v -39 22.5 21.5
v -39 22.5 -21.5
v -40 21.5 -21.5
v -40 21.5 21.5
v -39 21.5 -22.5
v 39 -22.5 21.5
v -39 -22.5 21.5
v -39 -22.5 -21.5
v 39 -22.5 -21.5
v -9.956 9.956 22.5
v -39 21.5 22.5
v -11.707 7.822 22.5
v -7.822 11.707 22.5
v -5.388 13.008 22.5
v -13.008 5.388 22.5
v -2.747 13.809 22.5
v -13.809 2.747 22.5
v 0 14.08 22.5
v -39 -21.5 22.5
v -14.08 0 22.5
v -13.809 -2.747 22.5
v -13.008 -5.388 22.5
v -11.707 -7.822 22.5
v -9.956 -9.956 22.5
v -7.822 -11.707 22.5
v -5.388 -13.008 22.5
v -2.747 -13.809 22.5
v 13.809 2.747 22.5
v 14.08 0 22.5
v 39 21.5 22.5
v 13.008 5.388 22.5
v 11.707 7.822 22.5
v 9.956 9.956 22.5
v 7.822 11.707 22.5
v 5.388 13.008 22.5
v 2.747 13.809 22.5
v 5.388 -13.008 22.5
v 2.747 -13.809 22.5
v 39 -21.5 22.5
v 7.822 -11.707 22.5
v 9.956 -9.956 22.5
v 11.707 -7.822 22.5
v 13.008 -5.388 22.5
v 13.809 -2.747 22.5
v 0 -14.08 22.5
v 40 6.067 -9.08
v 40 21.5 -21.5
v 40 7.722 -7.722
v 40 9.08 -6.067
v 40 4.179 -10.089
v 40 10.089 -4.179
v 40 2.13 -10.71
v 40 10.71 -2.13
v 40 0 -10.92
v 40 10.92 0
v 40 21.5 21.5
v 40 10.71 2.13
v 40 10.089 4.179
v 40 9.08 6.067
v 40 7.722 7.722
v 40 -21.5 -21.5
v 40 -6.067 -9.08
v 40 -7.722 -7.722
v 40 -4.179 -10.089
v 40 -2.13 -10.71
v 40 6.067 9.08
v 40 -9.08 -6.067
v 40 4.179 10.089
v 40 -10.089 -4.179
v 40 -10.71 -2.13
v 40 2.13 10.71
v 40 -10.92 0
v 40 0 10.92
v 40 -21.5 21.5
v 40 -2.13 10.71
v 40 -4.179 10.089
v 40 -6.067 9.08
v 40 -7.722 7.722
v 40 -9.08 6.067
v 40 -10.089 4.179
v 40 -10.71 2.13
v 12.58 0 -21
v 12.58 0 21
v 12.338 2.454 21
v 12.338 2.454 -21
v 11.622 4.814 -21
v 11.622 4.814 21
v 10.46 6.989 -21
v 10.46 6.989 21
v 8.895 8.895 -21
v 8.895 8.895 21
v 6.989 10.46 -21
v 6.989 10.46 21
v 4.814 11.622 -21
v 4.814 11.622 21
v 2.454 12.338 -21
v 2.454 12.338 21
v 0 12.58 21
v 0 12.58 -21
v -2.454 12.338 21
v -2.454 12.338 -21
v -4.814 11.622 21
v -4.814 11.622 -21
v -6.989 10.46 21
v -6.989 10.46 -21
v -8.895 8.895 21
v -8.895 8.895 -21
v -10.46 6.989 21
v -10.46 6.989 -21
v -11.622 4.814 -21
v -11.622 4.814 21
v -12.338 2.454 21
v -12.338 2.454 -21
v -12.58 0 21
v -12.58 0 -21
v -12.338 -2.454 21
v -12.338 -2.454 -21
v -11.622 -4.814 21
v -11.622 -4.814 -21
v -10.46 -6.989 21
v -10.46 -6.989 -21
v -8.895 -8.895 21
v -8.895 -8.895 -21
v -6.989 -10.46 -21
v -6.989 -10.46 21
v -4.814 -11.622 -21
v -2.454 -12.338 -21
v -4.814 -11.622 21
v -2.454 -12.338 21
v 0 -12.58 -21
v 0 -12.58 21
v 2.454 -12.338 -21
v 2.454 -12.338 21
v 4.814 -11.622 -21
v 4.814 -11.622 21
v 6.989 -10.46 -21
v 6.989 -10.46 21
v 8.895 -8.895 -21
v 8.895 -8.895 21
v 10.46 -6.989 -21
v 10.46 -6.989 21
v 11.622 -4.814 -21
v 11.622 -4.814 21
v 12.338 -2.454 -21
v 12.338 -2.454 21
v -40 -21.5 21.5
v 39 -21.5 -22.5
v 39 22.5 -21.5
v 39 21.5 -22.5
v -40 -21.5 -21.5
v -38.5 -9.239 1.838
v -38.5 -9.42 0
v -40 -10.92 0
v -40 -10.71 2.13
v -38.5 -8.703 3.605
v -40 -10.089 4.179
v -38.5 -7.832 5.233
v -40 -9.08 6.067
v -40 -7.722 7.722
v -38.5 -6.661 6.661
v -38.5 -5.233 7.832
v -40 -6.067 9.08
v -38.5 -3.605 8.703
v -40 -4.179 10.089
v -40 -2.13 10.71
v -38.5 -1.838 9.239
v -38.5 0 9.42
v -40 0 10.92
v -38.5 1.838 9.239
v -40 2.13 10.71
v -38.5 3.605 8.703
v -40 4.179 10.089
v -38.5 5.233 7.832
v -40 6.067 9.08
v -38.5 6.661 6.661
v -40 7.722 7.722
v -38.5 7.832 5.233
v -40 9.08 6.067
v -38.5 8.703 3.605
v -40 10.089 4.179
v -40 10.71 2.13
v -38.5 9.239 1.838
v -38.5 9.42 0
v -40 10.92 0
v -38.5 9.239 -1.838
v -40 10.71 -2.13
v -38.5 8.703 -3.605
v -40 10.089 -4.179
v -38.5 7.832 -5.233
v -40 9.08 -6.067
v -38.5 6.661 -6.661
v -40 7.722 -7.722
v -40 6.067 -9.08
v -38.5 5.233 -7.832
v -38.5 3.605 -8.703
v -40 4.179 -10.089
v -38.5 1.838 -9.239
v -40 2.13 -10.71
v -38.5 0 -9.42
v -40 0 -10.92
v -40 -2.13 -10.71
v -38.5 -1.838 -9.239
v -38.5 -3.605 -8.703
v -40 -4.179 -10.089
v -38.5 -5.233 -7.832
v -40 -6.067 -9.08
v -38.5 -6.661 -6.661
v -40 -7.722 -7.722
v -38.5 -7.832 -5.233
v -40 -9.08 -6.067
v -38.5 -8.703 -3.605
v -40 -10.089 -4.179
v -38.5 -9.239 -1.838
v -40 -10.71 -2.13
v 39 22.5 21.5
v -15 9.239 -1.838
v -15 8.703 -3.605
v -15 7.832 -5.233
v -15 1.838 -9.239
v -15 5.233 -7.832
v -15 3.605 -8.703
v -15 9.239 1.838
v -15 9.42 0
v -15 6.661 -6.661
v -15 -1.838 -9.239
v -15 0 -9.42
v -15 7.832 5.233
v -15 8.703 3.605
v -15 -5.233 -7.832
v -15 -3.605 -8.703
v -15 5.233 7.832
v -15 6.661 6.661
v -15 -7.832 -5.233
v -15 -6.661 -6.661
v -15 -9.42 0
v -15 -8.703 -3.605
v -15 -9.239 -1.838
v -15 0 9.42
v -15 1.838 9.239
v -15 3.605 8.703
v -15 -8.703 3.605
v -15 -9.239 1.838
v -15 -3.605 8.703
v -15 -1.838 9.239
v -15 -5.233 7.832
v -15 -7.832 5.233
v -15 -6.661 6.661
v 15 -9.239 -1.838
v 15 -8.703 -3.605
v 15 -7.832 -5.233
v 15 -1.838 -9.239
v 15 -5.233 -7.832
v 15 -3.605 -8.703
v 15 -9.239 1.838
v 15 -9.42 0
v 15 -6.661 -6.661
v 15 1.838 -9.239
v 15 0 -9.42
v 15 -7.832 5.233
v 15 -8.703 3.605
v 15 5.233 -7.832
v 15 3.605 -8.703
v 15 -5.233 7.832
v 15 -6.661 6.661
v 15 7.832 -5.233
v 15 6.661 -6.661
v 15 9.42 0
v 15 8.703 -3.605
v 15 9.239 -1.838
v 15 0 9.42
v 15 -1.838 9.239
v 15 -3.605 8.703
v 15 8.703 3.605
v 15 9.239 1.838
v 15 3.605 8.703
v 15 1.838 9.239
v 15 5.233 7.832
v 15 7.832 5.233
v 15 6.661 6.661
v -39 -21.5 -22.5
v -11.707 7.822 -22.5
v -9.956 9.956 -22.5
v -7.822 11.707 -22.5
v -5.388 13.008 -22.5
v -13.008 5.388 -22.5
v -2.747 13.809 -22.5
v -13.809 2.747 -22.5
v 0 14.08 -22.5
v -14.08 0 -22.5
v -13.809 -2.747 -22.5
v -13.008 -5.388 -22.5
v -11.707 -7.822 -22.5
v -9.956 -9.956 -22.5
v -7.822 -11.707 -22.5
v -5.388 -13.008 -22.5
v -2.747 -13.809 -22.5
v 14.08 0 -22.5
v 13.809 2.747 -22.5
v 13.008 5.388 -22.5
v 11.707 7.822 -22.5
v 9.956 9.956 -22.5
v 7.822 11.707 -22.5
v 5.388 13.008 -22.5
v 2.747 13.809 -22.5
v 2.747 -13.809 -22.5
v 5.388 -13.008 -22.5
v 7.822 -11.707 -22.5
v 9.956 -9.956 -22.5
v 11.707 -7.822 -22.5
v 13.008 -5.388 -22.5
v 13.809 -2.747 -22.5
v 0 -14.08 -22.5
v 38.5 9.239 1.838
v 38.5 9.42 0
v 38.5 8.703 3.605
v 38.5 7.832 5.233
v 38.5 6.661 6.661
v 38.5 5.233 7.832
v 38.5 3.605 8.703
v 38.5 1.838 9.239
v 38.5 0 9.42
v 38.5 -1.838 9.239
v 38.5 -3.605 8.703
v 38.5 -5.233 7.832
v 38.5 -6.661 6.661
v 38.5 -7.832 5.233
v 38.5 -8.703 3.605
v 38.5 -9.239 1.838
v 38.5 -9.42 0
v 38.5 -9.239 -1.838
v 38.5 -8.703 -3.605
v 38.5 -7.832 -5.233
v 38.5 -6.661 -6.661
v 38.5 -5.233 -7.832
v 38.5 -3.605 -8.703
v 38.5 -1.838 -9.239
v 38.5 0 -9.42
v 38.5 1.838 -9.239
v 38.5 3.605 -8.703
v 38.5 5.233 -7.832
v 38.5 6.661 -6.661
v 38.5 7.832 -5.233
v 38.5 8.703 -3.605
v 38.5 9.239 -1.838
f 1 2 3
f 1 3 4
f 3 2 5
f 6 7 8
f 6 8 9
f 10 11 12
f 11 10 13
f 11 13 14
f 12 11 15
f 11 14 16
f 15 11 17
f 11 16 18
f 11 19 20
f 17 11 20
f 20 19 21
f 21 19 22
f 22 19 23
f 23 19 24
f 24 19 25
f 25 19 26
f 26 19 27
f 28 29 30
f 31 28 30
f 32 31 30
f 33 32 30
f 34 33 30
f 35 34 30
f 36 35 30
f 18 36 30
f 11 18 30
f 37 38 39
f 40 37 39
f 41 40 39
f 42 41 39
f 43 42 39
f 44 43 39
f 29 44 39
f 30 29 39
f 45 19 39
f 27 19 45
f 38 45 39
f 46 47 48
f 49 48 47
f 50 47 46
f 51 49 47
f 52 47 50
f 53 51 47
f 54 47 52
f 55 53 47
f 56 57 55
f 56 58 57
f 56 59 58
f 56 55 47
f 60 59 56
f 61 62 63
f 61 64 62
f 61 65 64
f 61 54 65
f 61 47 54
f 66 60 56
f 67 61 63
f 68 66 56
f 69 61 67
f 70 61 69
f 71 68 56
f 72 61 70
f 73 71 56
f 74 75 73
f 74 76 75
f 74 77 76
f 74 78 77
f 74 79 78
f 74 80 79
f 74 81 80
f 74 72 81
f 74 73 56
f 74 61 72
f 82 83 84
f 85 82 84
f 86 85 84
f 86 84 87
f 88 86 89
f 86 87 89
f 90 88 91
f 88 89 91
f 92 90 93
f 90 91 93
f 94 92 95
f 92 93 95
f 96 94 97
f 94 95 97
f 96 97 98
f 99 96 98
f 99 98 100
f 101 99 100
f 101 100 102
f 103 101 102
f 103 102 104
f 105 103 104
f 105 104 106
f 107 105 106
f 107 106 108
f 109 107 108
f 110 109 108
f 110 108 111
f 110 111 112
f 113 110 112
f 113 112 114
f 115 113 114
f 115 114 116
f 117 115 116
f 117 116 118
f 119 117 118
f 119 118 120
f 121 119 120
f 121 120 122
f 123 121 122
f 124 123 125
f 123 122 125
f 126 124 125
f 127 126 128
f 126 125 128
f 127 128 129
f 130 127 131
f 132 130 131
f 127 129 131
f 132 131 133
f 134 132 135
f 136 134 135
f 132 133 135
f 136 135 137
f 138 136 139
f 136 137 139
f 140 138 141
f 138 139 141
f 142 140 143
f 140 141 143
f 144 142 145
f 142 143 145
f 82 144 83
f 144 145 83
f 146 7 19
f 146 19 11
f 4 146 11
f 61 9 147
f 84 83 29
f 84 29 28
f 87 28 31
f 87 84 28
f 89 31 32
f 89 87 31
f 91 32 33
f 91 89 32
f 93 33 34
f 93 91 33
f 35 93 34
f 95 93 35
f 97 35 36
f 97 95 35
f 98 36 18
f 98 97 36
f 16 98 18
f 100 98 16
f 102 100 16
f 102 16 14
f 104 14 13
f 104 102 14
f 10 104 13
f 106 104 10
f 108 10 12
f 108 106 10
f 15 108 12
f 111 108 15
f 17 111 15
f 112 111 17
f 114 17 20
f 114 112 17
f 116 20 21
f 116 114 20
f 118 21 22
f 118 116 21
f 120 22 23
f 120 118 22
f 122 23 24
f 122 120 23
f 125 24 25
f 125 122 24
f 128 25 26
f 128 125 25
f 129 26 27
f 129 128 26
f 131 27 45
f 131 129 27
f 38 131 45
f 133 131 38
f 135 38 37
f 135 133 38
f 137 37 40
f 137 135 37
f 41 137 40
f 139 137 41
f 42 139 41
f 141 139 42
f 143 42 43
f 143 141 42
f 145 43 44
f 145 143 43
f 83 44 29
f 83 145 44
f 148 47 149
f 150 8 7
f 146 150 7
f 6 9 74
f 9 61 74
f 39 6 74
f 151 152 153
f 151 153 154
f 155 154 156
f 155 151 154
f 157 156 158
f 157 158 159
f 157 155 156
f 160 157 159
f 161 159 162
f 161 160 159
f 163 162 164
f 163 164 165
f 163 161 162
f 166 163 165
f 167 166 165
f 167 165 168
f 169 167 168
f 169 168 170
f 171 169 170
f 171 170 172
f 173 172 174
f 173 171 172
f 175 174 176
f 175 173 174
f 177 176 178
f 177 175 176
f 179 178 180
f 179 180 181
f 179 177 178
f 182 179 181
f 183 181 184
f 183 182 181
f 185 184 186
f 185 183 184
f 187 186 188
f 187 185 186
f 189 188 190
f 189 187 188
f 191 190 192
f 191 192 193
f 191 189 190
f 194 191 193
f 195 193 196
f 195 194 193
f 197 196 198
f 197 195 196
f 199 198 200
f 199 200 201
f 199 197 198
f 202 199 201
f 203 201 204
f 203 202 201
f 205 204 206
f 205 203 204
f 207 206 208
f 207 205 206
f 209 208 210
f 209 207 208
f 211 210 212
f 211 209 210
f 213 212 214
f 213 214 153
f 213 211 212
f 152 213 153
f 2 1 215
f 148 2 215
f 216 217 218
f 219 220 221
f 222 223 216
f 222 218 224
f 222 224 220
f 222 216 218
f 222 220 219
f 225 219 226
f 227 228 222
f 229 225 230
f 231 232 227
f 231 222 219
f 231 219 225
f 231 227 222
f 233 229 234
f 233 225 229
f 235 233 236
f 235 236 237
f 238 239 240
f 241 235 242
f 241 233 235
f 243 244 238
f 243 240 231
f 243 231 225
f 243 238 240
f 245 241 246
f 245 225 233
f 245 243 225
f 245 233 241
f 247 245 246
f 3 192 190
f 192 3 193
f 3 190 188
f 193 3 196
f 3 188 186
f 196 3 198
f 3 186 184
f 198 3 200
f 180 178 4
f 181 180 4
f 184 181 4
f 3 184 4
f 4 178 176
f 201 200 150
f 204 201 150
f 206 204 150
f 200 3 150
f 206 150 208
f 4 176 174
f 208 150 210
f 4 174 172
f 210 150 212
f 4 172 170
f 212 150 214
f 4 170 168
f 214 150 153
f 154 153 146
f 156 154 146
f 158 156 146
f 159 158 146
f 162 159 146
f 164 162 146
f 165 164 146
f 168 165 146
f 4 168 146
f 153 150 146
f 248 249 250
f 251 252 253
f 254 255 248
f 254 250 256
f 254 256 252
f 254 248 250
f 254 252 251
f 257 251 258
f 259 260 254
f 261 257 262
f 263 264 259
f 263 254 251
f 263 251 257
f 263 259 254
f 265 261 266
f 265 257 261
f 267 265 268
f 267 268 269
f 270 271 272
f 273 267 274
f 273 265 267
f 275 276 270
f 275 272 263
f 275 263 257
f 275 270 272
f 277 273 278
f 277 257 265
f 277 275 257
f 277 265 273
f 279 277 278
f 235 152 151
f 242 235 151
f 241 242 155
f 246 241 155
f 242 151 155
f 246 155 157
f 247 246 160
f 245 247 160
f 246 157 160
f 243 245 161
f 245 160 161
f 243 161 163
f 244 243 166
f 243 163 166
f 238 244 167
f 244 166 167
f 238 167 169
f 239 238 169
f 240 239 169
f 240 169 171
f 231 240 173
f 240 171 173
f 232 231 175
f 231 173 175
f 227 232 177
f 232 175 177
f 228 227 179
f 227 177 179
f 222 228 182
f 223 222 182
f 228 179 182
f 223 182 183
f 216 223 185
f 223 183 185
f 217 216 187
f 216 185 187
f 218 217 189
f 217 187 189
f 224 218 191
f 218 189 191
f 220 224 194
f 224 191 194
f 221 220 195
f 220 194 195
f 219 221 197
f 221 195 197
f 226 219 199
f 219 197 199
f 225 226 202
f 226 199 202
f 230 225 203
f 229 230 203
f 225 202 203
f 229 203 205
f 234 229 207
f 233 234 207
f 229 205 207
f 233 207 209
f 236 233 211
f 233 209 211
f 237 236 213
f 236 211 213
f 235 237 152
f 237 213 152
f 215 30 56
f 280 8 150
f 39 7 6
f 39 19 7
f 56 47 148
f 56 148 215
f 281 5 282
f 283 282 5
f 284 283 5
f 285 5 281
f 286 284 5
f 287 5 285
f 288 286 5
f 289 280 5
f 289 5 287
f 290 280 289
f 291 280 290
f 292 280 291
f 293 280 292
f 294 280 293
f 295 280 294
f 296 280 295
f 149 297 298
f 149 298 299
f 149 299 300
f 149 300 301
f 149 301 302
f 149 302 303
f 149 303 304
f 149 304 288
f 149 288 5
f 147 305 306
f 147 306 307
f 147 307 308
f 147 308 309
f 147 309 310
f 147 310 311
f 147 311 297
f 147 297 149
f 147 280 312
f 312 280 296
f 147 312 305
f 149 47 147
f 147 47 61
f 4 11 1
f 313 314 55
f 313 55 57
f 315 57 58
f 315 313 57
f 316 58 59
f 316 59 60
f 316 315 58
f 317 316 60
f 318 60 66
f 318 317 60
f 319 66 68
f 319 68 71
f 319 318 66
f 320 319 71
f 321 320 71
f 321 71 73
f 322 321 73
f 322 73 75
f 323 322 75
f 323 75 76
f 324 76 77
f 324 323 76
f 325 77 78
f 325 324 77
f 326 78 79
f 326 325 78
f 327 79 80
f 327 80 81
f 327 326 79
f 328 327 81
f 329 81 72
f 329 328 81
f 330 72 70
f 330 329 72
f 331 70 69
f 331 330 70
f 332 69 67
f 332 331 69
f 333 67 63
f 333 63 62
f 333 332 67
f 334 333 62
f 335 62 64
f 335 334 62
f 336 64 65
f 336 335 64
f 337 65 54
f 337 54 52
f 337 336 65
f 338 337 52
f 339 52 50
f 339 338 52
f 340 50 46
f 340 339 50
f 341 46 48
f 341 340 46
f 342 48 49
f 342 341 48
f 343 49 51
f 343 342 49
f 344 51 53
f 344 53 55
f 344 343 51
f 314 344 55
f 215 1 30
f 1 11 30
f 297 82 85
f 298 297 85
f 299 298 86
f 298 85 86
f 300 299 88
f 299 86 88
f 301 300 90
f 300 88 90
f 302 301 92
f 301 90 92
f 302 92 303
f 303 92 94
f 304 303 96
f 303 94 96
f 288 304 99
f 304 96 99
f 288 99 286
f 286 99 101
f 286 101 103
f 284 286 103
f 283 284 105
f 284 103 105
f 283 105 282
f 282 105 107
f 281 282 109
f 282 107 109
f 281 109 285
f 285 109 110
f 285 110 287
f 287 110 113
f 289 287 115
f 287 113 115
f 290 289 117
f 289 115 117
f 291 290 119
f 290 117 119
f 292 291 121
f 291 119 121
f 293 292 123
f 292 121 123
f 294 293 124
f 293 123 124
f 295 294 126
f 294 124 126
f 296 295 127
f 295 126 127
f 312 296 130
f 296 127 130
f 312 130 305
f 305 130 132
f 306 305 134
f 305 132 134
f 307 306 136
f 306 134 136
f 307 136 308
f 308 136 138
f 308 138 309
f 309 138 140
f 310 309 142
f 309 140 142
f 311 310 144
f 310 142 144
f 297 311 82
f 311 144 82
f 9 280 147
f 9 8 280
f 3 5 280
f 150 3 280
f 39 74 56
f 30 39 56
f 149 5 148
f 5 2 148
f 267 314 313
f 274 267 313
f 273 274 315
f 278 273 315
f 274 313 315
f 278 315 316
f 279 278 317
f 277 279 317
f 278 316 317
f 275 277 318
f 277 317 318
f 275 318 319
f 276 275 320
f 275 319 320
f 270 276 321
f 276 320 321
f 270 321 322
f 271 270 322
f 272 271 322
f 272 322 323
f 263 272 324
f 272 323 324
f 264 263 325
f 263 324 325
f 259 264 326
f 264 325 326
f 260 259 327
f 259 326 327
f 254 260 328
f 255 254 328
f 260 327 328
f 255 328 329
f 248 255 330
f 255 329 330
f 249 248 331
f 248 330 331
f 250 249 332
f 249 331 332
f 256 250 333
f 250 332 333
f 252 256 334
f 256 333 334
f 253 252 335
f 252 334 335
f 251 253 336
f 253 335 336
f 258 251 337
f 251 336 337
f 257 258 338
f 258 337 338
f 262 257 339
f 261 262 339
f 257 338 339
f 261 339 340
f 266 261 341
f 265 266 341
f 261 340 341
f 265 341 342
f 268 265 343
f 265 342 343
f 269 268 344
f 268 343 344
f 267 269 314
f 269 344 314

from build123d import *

# Parameters (mm, degrees)
F0_W     = 80
F0_H     = 45
F1_DEPTH = 22.5
F2_R     = 12.58
F3_DEPTH = 45.001
F4_R     = 9.42
F5_DEPTH = 25
F6_R     = 9.42
F7_DEPTH = 25
F8_SIZE  = 1.5
F9_SIZE  = 1


with BuildPart() as f1:
    # F0 (on Front) → F1 (new body, symmetric)
    with BuildSketch(Plane.XZ):
        Rectangle(F0_W, F0_H)
    extrude(amount=F1_DEPTH, both=True)

    # F2 (on face) → F3 (cut, through all)
    with BuildSketch(Plane.XY.offset(22.5)):
        Circle(F2_R)
    extrude(amount=-F3_DEPTH, mode=Mode.SUBTRACT)

    # F4 (on face) → F5 (cut)
    with BuildSketch(Plane(origin=(-40, 0, 0), x_dir=(0, -1, 0), z_dir=(-1, 0, 0))):
        Circle(F4_R)
    extrude(amount=-F5_DEPTH, mode=Mode.SUBTRACT)

    # F6 (on face) → F7 (cut)
    with BuildSketch(Plane.YZ.offset(40)):
        Circle(F6_R)
    extrude(amount=-F7_DEPTH, mode=Mode.SUBTRACT)

    # F8
    f8_edges = [f1.edges().sort_by_distance(p)[0] for p in [
        (-12.58, 0, 22.5),
        (-40, 9.42, 0),
        (-12.58, 0, -22.5),
        (40, -9.42, 0),
    ]]
    chamfer(f8_edges, length=F8_SIZE)

    # F9
    f9_edges = [f1.edges().sort_by_distance(p)[0] for p in [
        (0, -22.5, 22.5),
        (40, -22.5, 0),
        (0, -22.5, -22.5),
        (-40, -22.5, 0),
        (40, 0, 22.5),
        (0, 22.5, 22.5),
        (-40, 0, 22.5),
        (40, 0, -22.5),
        (40, 22.5, 0),
        (0, 22.5, -22.5),
        (-40, 22.5, 0),
        (-40, 0, -22.5),
    ]]
    chamfer(f9_edges, length=F9_SIZE)


solid = f1.part
